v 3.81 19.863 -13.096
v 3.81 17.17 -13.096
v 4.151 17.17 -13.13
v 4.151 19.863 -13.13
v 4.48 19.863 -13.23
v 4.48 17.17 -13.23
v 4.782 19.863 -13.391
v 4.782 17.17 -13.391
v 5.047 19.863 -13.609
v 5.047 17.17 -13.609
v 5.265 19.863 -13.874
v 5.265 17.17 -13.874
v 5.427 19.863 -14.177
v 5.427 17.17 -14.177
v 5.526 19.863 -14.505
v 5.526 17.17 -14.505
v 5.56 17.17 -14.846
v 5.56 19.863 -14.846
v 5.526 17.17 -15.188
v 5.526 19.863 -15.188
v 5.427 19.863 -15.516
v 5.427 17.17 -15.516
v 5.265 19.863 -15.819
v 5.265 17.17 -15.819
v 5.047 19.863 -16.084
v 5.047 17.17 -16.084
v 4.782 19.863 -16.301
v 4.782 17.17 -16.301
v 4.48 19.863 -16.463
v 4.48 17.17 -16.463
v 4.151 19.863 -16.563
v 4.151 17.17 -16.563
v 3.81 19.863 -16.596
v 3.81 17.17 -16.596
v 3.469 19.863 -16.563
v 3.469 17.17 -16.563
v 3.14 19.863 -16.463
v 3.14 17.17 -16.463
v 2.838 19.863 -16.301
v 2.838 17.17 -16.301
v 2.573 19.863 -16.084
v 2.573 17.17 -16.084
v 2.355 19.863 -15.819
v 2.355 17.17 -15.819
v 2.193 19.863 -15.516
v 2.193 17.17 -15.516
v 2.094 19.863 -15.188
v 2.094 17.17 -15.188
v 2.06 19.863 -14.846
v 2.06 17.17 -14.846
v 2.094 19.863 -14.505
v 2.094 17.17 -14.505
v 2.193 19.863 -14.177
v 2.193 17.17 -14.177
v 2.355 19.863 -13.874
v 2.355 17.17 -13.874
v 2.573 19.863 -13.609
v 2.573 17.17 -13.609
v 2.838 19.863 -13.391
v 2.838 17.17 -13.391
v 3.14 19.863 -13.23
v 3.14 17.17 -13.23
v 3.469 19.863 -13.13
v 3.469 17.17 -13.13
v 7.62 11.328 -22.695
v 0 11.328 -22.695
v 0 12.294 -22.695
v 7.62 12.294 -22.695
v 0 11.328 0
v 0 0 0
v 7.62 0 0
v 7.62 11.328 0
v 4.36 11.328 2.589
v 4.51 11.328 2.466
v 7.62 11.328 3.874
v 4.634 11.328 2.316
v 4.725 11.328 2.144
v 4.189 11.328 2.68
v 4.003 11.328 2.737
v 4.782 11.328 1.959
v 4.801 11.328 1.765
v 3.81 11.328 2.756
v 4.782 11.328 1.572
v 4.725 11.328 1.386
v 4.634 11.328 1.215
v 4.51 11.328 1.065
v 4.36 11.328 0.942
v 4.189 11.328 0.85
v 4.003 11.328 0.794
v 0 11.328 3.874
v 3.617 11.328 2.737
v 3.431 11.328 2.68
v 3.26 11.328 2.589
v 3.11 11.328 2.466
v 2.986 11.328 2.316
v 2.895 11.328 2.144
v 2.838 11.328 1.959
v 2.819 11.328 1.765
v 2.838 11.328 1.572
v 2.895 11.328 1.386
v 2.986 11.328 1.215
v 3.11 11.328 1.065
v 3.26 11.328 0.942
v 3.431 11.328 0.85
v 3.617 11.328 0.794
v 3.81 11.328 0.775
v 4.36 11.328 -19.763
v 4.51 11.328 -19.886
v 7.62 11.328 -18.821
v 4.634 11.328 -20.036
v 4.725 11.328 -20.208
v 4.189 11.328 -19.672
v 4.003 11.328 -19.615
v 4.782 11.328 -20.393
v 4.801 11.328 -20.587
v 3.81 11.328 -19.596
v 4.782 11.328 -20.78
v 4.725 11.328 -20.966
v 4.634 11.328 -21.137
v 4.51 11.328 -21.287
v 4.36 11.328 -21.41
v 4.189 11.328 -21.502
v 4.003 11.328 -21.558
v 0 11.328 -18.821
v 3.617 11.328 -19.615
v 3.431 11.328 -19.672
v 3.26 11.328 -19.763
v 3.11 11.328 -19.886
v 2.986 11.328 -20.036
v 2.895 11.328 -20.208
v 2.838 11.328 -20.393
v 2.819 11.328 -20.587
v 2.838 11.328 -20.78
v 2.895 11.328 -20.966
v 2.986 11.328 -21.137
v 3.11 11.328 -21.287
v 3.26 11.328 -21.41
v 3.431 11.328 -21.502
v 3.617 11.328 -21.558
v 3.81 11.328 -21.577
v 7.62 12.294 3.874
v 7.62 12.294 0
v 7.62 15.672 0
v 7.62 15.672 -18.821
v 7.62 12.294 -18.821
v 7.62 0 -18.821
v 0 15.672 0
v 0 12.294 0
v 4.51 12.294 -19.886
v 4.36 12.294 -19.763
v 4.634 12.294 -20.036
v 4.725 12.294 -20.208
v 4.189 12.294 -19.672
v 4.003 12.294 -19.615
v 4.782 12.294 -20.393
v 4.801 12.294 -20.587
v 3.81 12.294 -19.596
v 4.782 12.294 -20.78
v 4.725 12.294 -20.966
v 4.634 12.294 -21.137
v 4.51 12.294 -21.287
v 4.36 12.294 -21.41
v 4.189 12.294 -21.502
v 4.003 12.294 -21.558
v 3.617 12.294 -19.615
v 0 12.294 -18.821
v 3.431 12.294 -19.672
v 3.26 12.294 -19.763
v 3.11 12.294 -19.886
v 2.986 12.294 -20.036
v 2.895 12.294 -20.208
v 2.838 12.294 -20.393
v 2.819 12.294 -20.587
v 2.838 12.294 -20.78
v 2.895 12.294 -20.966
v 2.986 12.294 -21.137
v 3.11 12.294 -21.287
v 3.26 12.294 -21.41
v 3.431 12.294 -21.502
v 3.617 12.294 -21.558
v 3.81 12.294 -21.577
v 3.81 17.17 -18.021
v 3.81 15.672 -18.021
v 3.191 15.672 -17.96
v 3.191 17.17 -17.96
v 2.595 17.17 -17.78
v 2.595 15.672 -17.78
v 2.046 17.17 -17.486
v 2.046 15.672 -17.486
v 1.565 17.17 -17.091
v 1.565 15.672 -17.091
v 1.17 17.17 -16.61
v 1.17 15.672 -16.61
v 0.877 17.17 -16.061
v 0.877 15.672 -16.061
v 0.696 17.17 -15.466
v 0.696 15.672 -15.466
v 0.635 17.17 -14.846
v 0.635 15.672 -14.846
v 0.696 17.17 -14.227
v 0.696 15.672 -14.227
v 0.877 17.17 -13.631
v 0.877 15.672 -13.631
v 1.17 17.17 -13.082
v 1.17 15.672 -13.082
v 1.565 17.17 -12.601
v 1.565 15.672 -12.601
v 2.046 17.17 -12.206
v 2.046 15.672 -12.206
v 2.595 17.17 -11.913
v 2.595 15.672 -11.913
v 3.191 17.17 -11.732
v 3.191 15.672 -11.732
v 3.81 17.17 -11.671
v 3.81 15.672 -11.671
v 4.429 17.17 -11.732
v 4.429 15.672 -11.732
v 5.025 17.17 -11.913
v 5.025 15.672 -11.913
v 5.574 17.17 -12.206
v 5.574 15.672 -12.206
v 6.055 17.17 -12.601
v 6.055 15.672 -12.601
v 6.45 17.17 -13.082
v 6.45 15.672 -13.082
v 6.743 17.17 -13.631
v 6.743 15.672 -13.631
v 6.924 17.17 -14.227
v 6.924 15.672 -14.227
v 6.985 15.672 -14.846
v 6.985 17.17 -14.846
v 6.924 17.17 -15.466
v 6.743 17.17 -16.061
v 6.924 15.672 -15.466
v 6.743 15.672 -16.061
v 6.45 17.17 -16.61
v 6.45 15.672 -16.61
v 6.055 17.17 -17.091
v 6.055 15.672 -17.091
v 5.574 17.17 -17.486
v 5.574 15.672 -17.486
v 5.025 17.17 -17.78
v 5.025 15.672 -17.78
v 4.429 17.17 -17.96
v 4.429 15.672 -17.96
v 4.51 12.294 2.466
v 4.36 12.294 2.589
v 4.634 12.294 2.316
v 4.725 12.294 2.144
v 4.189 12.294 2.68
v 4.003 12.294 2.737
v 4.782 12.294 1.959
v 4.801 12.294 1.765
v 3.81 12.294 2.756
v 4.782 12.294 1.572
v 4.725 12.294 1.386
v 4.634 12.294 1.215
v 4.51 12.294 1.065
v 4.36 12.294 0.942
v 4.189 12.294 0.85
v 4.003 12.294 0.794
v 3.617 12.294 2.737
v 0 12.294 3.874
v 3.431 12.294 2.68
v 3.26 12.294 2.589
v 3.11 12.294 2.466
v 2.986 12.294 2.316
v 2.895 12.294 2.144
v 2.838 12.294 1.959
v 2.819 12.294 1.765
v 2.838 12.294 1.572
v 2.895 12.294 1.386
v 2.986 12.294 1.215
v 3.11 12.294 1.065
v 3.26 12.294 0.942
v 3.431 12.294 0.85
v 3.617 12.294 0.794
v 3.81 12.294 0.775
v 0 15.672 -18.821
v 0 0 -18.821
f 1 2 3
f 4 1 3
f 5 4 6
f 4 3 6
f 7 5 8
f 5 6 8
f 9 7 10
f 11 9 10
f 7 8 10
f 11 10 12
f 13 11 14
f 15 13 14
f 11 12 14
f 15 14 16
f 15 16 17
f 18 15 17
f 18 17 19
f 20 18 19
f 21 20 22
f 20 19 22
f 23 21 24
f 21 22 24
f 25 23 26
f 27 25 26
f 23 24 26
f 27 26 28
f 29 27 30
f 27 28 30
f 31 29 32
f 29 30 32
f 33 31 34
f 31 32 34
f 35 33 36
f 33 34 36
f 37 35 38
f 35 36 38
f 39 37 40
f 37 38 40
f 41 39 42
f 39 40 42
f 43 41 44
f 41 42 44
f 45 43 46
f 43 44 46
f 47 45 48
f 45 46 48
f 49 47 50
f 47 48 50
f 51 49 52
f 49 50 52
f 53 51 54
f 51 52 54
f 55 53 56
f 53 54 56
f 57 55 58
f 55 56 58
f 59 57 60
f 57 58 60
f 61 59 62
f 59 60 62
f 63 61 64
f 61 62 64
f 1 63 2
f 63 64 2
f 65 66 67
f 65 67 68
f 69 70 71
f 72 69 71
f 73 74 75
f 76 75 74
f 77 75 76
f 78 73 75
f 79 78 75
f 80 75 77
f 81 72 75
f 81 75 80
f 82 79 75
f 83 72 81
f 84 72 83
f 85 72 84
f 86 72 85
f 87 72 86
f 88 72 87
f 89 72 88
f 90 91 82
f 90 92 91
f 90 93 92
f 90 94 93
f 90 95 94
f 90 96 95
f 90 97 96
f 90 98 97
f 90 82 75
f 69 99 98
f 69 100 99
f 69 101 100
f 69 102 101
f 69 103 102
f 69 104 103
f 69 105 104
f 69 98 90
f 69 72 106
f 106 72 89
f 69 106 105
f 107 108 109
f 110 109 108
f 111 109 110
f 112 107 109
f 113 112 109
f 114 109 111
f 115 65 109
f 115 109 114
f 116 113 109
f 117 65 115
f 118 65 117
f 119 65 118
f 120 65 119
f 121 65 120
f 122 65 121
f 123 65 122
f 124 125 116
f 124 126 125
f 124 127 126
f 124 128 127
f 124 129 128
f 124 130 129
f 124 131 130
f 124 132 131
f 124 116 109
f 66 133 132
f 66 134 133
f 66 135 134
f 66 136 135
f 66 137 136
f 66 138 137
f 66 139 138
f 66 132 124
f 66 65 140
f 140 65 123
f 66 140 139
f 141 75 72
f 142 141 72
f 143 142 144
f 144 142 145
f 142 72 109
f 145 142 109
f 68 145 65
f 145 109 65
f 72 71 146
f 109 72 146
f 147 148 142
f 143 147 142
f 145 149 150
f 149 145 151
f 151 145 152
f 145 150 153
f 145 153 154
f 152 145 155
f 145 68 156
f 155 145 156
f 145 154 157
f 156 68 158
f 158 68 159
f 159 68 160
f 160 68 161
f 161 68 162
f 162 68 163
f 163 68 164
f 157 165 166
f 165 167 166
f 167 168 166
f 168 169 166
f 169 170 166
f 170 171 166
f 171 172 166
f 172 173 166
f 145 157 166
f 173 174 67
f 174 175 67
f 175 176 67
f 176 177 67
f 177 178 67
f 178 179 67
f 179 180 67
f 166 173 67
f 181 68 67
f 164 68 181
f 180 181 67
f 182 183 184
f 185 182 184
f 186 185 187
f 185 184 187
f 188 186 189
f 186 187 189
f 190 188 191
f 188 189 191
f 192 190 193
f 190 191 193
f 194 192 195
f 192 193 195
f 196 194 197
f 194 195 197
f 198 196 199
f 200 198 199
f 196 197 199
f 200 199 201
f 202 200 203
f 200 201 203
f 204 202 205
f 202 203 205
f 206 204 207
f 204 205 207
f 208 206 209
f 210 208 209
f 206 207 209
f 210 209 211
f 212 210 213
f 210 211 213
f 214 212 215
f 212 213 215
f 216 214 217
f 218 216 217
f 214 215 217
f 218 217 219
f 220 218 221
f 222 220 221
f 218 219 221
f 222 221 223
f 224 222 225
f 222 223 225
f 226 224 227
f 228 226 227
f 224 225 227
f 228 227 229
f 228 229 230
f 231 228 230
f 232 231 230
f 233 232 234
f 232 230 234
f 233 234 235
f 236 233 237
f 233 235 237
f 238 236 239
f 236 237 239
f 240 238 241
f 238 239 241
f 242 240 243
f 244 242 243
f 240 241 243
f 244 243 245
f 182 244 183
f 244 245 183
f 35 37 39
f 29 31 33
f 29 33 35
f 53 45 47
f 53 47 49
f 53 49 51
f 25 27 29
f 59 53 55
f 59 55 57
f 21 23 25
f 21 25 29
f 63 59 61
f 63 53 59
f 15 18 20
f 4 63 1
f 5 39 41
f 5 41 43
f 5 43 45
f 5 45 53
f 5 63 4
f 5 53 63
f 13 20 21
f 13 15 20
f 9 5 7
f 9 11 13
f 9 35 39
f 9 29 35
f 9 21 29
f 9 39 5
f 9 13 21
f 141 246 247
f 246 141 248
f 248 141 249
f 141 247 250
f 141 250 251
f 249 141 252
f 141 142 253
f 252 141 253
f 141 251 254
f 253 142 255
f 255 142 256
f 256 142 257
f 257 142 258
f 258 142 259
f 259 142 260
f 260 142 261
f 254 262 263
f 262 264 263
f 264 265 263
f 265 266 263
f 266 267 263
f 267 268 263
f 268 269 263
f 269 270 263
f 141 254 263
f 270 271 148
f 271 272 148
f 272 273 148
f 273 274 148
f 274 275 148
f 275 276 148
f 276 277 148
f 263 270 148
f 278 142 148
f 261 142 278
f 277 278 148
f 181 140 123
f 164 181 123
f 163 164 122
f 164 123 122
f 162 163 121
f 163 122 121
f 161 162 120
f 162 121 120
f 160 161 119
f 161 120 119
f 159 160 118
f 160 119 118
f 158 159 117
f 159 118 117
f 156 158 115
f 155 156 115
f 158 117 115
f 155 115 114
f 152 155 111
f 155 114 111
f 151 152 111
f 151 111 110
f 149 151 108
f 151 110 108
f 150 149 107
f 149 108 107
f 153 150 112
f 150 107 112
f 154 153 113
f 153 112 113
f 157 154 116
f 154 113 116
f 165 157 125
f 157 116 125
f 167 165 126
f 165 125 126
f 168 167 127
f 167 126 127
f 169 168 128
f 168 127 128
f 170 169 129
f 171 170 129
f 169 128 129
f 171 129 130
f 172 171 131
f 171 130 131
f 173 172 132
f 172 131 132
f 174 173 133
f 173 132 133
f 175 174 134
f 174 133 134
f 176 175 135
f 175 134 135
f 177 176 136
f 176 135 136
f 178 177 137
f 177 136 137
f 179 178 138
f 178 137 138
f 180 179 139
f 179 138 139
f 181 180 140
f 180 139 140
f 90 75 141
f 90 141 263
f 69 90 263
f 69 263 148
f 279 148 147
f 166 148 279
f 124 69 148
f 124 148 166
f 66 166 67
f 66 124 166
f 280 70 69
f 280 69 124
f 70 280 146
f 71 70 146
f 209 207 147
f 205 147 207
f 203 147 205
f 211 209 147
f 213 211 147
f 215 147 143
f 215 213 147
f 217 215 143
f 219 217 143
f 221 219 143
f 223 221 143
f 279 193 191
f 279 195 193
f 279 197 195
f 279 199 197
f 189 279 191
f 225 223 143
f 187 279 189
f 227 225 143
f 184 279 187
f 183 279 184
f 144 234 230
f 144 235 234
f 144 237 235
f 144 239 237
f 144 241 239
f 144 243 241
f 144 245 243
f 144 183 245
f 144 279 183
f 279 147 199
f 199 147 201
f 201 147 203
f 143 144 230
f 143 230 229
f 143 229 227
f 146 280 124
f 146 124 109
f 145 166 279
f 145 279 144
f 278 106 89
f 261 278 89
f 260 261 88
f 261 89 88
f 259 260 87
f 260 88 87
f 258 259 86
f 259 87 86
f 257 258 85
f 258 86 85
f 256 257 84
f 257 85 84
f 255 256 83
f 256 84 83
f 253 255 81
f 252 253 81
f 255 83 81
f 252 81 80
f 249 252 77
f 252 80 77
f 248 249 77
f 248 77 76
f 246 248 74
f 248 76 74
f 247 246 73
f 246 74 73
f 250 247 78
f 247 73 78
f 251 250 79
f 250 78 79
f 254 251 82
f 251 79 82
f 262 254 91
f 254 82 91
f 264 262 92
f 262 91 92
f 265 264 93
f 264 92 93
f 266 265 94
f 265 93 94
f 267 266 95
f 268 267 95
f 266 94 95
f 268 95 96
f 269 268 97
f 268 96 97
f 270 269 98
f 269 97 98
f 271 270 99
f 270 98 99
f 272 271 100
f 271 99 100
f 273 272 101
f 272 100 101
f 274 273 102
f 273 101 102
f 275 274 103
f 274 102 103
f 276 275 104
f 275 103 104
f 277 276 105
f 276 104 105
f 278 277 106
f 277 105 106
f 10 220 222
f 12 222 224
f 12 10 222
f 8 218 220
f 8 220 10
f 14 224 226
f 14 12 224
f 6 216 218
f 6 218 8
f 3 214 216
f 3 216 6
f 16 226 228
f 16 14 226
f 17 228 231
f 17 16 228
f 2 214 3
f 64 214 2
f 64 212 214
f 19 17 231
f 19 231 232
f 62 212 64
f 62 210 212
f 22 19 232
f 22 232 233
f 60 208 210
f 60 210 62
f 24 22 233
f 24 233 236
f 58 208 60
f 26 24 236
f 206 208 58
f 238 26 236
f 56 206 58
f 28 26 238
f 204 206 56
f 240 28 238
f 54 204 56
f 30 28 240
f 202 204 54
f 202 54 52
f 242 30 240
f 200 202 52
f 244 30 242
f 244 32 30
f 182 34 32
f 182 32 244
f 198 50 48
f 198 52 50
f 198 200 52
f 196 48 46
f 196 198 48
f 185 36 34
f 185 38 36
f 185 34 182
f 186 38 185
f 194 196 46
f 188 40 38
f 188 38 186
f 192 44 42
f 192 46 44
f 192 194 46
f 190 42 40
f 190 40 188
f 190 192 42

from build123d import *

# Parameters (mm, degrees)
SKETCH1_W           = 7.62
SKETCH1_H           = 18.8214
BOSS_EXTRUDE1_DEPTH = 15.6718
SKETCH2_R           = 0.9906
BOSS_EXTRUDE2_DEPTH = 0.9652
SKETCH3_R           = 3.175
BOSS_EXTRUDE3_DEPTH = 1.4986
SKETCH4_R           = 1.75
BOSS_EXTRUDE4_DEPTH = 2.6924


with BuildPart() as part:
    # Sketch1 → Boss-Extrude1 (new body)
    with BuildSketch(Plane(origin=(0, 0, 0), x_dir=(1, 0, 0), z_dir=(0, 1, 0))):
        with Locations((3.81, 9.4107)):
            Rectangle(SKETCH1_W, SKETCH1_H)
    extrude(amount=BOSS_EXTRUDE1_DEPTH)

    # Sketch2 → Boss-Extrude2 (add)
    # profile 1 of 2: a face of its own
    with BuildSketch(Plane(origin=(0, 11.3284, 0), x_dir=(-1, 0, 0), z_dir=(0, -1, 0))):
        Polygon((0, 0), (-7.62, 0), (-7.62, -3.8735), (-5.08, -3.8735), (-2.54, -3.8735), (0, -3.8735), align=None)
        with Locations(Location((-3.81, -1.7653, 0), (0, 0, 90))):
            Circle(SKETCH2_R, mode=Mode.SUBTRACT)
    # profile 2 of 2: a face of its own
    with BuildSketch(Plane(origin=(0, 11.3284, 0), x_dir=(-1, 0, 0), z_dir=(0, -1, 0))):
        Polygon((-7.62, 18.8214), (0, 18.8214), (0, 22.6949), (-2.54, 22.6949), (-5.08, 22.6949), (-7.62, 22.6949), align=None)
        with Locations(Location((-3.81, 20.5867, 0), (0, 0, 90))):
            Circle(SKETCH2_R, mode=Mode.SUBTRACT)
    extrude(amount=-BOSS_EXTRUDE2_DEPTH)

    # Sketch3 → Boss-Extrude3 (add)
    with BuildSketch(Plane(origin=(0, 15.6718, 0), x_dir=(1, 0, 0), z_dir=(0, 1, 0))):
        with Locations(Location((3.81, 14.8463, 0), (0, 0, 90))):
            Circle(SKETCH3_R)
    extrude(amount=BOSS_EXTRUDE3_DEPTH)

    # Sketch4 → Boss-Extrude4 (add)
    with BuildSketch(Plane(origin=(0, 17.1704, 0), x_dir=(1, 0, 0), z_dir=(0, 1, 0))):
        with Locations(Location((3.81, 14.8463, 0), (0, 0, 270))):
            Circle(SKETCH4_R)
    extrude(amount=BOSS_EXTRUDE4_DEPTH)


solid = part.part
